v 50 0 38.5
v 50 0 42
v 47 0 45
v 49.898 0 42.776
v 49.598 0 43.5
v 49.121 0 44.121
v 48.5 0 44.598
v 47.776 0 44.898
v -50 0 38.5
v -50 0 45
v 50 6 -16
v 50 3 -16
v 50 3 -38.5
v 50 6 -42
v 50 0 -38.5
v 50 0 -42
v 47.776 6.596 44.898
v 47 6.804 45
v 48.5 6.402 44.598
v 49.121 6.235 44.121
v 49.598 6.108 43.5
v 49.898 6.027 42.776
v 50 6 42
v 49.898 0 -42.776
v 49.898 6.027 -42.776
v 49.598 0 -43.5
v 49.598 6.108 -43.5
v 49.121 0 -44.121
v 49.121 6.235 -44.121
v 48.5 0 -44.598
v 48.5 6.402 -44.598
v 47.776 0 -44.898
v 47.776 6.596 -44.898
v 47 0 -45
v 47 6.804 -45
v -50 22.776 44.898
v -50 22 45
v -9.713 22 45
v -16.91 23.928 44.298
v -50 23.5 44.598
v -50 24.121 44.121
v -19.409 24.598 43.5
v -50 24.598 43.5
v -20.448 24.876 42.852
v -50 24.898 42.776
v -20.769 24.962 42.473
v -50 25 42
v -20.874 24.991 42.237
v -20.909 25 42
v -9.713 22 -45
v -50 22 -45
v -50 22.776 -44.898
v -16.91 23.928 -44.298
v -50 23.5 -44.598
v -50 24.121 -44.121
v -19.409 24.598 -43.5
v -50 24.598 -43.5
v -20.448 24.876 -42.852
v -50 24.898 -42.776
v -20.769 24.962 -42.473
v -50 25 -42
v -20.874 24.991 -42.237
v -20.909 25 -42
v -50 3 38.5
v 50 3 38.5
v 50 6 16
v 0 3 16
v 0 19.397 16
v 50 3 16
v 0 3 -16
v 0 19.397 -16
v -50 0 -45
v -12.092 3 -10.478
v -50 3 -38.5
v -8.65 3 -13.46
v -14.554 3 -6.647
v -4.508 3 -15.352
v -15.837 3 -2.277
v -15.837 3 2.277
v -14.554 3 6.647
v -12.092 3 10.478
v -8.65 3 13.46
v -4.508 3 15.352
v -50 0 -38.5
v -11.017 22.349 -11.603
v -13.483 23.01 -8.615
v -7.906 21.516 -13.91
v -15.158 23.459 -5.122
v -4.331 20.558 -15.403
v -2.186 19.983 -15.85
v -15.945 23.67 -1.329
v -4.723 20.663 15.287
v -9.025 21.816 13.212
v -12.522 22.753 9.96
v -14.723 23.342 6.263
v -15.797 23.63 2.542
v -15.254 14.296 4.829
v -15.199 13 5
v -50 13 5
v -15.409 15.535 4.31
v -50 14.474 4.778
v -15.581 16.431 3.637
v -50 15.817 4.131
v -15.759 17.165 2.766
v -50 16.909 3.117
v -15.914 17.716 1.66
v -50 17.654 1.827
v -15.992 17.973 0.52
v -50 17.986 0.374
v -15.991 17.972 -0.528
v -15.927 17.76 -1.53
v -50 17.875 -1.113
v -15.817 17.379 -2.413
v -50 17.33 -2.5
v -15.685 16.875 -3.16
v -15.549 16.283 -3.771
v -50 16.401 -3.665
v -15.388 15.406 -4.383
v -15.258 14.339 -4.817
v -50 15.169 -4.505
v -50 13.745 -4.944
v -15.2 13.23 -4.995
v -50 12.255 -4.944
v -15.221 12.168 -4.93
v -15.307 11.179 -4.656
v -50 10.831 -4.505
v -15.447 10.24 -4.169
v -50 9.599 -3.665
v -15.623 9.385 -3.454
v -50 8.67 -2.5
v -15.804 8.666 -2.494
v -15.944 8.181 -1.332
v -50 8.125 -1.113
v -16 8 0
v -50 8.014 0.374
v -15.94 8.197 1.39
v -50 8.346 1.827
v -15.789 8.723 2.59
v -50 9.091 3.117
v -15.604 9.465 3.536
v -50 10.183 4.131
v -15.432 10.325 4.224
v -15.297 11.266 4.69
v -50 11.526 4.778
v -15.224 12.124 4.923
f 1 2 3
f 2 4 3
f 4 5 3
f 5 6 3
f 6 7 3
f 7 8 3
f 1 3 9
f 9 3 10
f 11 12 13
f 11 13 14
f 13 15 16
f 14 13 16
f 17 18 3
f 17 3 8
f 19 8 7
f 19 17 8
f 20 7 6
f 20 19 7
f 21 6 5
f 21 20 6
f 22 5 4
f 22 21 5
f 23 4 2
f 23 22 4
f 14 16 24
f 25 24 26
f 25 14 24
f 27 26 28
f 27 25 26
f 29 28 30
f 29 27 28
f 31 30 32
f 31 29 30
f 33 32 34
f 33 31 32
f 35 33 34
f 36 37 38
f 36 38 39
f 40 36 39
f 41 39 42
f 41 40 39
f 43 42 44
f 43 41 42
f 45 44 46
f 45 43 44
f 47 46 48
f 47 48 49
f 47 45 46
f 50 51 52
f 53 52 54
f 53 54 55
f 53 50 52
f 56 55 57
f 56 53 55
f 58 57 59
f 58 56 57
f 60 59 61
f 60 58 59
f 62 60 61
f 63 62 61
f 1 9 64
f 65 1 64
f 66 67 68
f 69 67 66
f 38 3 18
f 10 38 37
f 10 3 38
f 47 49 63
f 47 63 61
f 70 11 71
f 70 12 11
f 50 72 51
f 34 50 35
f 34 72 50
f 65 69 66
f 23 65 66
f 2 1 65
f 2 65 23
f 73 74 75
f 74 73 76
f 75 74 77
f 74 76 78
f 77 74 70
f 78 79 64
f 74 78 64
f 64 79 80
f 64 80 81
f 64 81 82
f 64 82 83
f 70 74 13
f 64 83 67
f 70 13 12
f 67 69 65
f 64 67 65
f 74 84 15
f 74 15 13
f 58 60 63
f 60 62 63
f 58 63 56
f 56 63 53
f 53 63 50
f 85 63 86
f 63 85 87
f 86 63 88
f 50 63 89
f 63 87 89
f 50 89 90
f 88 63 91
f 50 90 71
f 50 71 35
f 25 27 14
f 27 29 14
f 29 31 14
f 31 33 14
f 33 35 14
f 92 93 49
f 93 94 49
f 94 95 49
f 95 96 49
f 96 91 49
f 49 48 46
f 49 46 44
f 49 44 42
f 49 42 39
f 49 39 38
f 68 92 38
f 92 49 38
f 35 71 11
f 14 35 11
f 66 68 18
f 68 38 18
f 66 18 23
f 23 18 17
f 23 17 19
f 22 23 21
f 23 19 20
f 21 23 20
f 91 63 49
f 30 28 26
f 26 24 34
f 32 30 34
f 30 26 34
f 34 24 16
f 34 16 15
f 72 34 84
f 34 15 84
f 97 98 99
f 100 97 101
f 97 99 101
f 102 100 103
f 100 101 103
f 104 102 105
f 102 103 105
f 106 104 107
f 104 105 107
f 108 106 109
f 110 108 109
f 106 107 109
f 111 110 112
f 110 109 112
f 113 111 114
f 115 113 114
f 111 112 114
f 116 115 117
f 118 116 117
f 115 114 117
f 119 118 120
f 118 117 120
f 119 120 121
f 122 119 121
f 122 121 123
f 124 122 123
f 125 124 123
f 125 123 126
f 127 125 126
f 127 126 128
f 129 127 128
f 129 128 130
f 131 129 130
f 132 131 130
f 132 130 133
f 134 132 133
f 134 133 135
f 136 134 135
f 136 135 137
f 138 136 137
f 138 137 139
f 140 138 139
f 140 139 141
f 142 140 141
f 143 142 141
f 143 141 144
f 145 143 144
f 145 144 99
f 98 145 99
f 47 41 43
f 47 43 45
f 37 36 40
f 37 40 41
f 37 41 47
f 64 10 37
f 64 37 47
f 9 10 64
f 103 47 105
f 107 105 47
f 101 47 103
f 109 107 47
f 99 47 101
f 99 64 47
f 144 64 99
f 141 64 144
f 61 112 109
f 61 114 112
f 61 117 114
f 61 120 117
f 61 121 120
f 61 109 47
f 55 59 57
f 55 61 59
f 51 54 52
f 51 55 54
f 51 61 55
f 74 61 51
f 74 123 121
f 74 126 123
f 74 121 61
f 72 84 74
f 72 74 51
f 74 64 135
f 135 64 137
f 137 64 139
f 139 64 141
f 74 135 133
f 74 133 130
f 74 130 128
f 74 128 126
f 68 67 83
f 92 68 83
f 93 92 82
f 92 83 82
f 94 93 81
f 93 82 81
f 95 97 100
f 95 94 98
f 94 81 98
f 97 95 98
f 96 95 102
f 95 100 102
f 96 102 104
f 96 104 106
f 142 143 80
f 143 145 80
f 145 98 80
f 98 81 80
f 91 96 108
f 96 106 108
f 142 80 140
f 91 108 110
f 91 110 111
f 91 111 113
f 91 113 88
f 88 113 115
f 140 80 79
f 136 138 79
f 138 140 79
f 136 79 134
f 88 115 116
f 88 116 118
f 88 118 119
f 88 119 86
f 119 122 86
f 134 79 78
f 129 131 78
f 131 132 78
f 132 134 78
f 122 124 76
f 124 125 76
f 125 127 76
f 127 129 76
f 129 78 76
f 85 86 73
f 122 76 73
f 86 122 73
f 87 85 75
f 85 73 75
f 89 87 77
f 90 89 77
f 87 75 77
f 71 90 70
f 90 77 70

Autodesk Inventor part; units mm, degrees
ref_plane "YZ Plane" through (0, 0, 0) normal (1, 0, 0) x (0, 1, 0)
ref_plane "XZ Plane" through (0, 0, 0) normal (0, 1, 0) x (-1, 0, 0)
ref_plane "XY Plane" through (0, 0, 0) normal (0, 0, 1) x (1, 0, 0)
sketch "Sketch1" plane through (0, 0, 0) normal (0, 1, 0) x (-1, 0, 0)
  arc A0 (0, -16) -> (0, 16) centre (0, 0) ccw
  line L0 (0, 16) -> (-50, 16)
  line L1 (-50, 16) -> (-50, -16)
  line L2 (-50, -16) -> (0, -16)
  line L3 (-50, 0) -> (-50, -45)
  line L4 (-50, -45) -> (-50, 45)
  line L5 (-50, 45) -> (50, 45)
  line L6 (50, 45) -> (50, -45)
  line L7 (50, -45) -> (-50, -45)
  dimension "d1" = 32
  dimension "d2" = 50
  dimension "d3" = 45
  dimension "d4" = 90
  dimension "d5" = 100
extrude "Extrusion1" add sketch "Sketch1" along normal blind 25 contours A0 L0 L4 L5 L6 L7 L3 L2
sketch "Sketch2" plane through (-50, 0, 45) normal (0, 0, 1) x (1, 0, 0)
  line L0 (0, 0) -> (100, 0)
  line L1 (50, 0) -> (100, 0) projected
  line L2 (100, 0) -> (100, 6)
  line L3 (100, 0) -> (100, 25) projected
  line L4 (0, 0) -> (0, 25)
  line L5 (0, 25) -> (29.091, 25)
  line L6 (0, 25) -> (100, 25) projected
  line L7 (29.091, 25) -> (100, 6)
  line L8 (29.091, 25) -> (100, 25)
  line L9 (100, 25) -> (100, 6)
  dimension "d8" = 6
extrude "Extrusion2" cut sketch "Sketch2" against normal through all contours L6 L3 L7
sketch "Sketch3" plane through (50, 0, 45) normal (1, 0, 0) x (0, 0, -1)
  line L0 (45, 0) -> (83.5, 0)
  line L1 (90, 0) -> (0, 0) projected
  line L2 (45, 0) -> (6.5, 0)
  line L3 (0, 0) -> (29, 0) projected
  line L4 (83.5, 0) -> (83.5, 3)
  line L5 (83.5, 3) -> (6.5, 3)
  line L6 (6.5, 0) -> (6.5, 3)
  dimension "d12" = 38.5
  dimension "d13" = 38.5
  dimension "d14" = 3
extrude "Extrusion3" cut sketch "Sketch3" against normal through all
sketch "Sketch4" plane through (-50, 0, 45) normal (-1, 0, 0) x (0, 0, 1)
  line L0 (-45, 0) -> (-45, 13)
  circle A0 centre (-45, 13) radius 5
  dimension "d17" = 13
  dimension "d18" = 10
extrude "Extrusion4" cut sketch "Sketch4" against normal through all
fillet "Fillet1" radius 3 4 edges at (-35.4545, 25, 45) (-35.4545, 25, -45) (50, 3, 45) (50, 3, -45)
equation "\"BendRadius\" = Thickness"
equation "\"BendReliefWidth\" = Thickness"
equation "\"BendReliefDepth\" = 0.5 * Thickness"
equation "\"CornerReliefSize\" = 4 * Thickness"
equation "\"MinimumRemnant\" = 2 * Thickness"
equation "\"TransitionRadius\" = BendRadius"
equation "\"JacobiRadiusSize\" = BendRadius"
equation "\"GapSize\" = Thickness"
equation "\"Thickness\" = 0.5"
properties part number "Sliding Block"
